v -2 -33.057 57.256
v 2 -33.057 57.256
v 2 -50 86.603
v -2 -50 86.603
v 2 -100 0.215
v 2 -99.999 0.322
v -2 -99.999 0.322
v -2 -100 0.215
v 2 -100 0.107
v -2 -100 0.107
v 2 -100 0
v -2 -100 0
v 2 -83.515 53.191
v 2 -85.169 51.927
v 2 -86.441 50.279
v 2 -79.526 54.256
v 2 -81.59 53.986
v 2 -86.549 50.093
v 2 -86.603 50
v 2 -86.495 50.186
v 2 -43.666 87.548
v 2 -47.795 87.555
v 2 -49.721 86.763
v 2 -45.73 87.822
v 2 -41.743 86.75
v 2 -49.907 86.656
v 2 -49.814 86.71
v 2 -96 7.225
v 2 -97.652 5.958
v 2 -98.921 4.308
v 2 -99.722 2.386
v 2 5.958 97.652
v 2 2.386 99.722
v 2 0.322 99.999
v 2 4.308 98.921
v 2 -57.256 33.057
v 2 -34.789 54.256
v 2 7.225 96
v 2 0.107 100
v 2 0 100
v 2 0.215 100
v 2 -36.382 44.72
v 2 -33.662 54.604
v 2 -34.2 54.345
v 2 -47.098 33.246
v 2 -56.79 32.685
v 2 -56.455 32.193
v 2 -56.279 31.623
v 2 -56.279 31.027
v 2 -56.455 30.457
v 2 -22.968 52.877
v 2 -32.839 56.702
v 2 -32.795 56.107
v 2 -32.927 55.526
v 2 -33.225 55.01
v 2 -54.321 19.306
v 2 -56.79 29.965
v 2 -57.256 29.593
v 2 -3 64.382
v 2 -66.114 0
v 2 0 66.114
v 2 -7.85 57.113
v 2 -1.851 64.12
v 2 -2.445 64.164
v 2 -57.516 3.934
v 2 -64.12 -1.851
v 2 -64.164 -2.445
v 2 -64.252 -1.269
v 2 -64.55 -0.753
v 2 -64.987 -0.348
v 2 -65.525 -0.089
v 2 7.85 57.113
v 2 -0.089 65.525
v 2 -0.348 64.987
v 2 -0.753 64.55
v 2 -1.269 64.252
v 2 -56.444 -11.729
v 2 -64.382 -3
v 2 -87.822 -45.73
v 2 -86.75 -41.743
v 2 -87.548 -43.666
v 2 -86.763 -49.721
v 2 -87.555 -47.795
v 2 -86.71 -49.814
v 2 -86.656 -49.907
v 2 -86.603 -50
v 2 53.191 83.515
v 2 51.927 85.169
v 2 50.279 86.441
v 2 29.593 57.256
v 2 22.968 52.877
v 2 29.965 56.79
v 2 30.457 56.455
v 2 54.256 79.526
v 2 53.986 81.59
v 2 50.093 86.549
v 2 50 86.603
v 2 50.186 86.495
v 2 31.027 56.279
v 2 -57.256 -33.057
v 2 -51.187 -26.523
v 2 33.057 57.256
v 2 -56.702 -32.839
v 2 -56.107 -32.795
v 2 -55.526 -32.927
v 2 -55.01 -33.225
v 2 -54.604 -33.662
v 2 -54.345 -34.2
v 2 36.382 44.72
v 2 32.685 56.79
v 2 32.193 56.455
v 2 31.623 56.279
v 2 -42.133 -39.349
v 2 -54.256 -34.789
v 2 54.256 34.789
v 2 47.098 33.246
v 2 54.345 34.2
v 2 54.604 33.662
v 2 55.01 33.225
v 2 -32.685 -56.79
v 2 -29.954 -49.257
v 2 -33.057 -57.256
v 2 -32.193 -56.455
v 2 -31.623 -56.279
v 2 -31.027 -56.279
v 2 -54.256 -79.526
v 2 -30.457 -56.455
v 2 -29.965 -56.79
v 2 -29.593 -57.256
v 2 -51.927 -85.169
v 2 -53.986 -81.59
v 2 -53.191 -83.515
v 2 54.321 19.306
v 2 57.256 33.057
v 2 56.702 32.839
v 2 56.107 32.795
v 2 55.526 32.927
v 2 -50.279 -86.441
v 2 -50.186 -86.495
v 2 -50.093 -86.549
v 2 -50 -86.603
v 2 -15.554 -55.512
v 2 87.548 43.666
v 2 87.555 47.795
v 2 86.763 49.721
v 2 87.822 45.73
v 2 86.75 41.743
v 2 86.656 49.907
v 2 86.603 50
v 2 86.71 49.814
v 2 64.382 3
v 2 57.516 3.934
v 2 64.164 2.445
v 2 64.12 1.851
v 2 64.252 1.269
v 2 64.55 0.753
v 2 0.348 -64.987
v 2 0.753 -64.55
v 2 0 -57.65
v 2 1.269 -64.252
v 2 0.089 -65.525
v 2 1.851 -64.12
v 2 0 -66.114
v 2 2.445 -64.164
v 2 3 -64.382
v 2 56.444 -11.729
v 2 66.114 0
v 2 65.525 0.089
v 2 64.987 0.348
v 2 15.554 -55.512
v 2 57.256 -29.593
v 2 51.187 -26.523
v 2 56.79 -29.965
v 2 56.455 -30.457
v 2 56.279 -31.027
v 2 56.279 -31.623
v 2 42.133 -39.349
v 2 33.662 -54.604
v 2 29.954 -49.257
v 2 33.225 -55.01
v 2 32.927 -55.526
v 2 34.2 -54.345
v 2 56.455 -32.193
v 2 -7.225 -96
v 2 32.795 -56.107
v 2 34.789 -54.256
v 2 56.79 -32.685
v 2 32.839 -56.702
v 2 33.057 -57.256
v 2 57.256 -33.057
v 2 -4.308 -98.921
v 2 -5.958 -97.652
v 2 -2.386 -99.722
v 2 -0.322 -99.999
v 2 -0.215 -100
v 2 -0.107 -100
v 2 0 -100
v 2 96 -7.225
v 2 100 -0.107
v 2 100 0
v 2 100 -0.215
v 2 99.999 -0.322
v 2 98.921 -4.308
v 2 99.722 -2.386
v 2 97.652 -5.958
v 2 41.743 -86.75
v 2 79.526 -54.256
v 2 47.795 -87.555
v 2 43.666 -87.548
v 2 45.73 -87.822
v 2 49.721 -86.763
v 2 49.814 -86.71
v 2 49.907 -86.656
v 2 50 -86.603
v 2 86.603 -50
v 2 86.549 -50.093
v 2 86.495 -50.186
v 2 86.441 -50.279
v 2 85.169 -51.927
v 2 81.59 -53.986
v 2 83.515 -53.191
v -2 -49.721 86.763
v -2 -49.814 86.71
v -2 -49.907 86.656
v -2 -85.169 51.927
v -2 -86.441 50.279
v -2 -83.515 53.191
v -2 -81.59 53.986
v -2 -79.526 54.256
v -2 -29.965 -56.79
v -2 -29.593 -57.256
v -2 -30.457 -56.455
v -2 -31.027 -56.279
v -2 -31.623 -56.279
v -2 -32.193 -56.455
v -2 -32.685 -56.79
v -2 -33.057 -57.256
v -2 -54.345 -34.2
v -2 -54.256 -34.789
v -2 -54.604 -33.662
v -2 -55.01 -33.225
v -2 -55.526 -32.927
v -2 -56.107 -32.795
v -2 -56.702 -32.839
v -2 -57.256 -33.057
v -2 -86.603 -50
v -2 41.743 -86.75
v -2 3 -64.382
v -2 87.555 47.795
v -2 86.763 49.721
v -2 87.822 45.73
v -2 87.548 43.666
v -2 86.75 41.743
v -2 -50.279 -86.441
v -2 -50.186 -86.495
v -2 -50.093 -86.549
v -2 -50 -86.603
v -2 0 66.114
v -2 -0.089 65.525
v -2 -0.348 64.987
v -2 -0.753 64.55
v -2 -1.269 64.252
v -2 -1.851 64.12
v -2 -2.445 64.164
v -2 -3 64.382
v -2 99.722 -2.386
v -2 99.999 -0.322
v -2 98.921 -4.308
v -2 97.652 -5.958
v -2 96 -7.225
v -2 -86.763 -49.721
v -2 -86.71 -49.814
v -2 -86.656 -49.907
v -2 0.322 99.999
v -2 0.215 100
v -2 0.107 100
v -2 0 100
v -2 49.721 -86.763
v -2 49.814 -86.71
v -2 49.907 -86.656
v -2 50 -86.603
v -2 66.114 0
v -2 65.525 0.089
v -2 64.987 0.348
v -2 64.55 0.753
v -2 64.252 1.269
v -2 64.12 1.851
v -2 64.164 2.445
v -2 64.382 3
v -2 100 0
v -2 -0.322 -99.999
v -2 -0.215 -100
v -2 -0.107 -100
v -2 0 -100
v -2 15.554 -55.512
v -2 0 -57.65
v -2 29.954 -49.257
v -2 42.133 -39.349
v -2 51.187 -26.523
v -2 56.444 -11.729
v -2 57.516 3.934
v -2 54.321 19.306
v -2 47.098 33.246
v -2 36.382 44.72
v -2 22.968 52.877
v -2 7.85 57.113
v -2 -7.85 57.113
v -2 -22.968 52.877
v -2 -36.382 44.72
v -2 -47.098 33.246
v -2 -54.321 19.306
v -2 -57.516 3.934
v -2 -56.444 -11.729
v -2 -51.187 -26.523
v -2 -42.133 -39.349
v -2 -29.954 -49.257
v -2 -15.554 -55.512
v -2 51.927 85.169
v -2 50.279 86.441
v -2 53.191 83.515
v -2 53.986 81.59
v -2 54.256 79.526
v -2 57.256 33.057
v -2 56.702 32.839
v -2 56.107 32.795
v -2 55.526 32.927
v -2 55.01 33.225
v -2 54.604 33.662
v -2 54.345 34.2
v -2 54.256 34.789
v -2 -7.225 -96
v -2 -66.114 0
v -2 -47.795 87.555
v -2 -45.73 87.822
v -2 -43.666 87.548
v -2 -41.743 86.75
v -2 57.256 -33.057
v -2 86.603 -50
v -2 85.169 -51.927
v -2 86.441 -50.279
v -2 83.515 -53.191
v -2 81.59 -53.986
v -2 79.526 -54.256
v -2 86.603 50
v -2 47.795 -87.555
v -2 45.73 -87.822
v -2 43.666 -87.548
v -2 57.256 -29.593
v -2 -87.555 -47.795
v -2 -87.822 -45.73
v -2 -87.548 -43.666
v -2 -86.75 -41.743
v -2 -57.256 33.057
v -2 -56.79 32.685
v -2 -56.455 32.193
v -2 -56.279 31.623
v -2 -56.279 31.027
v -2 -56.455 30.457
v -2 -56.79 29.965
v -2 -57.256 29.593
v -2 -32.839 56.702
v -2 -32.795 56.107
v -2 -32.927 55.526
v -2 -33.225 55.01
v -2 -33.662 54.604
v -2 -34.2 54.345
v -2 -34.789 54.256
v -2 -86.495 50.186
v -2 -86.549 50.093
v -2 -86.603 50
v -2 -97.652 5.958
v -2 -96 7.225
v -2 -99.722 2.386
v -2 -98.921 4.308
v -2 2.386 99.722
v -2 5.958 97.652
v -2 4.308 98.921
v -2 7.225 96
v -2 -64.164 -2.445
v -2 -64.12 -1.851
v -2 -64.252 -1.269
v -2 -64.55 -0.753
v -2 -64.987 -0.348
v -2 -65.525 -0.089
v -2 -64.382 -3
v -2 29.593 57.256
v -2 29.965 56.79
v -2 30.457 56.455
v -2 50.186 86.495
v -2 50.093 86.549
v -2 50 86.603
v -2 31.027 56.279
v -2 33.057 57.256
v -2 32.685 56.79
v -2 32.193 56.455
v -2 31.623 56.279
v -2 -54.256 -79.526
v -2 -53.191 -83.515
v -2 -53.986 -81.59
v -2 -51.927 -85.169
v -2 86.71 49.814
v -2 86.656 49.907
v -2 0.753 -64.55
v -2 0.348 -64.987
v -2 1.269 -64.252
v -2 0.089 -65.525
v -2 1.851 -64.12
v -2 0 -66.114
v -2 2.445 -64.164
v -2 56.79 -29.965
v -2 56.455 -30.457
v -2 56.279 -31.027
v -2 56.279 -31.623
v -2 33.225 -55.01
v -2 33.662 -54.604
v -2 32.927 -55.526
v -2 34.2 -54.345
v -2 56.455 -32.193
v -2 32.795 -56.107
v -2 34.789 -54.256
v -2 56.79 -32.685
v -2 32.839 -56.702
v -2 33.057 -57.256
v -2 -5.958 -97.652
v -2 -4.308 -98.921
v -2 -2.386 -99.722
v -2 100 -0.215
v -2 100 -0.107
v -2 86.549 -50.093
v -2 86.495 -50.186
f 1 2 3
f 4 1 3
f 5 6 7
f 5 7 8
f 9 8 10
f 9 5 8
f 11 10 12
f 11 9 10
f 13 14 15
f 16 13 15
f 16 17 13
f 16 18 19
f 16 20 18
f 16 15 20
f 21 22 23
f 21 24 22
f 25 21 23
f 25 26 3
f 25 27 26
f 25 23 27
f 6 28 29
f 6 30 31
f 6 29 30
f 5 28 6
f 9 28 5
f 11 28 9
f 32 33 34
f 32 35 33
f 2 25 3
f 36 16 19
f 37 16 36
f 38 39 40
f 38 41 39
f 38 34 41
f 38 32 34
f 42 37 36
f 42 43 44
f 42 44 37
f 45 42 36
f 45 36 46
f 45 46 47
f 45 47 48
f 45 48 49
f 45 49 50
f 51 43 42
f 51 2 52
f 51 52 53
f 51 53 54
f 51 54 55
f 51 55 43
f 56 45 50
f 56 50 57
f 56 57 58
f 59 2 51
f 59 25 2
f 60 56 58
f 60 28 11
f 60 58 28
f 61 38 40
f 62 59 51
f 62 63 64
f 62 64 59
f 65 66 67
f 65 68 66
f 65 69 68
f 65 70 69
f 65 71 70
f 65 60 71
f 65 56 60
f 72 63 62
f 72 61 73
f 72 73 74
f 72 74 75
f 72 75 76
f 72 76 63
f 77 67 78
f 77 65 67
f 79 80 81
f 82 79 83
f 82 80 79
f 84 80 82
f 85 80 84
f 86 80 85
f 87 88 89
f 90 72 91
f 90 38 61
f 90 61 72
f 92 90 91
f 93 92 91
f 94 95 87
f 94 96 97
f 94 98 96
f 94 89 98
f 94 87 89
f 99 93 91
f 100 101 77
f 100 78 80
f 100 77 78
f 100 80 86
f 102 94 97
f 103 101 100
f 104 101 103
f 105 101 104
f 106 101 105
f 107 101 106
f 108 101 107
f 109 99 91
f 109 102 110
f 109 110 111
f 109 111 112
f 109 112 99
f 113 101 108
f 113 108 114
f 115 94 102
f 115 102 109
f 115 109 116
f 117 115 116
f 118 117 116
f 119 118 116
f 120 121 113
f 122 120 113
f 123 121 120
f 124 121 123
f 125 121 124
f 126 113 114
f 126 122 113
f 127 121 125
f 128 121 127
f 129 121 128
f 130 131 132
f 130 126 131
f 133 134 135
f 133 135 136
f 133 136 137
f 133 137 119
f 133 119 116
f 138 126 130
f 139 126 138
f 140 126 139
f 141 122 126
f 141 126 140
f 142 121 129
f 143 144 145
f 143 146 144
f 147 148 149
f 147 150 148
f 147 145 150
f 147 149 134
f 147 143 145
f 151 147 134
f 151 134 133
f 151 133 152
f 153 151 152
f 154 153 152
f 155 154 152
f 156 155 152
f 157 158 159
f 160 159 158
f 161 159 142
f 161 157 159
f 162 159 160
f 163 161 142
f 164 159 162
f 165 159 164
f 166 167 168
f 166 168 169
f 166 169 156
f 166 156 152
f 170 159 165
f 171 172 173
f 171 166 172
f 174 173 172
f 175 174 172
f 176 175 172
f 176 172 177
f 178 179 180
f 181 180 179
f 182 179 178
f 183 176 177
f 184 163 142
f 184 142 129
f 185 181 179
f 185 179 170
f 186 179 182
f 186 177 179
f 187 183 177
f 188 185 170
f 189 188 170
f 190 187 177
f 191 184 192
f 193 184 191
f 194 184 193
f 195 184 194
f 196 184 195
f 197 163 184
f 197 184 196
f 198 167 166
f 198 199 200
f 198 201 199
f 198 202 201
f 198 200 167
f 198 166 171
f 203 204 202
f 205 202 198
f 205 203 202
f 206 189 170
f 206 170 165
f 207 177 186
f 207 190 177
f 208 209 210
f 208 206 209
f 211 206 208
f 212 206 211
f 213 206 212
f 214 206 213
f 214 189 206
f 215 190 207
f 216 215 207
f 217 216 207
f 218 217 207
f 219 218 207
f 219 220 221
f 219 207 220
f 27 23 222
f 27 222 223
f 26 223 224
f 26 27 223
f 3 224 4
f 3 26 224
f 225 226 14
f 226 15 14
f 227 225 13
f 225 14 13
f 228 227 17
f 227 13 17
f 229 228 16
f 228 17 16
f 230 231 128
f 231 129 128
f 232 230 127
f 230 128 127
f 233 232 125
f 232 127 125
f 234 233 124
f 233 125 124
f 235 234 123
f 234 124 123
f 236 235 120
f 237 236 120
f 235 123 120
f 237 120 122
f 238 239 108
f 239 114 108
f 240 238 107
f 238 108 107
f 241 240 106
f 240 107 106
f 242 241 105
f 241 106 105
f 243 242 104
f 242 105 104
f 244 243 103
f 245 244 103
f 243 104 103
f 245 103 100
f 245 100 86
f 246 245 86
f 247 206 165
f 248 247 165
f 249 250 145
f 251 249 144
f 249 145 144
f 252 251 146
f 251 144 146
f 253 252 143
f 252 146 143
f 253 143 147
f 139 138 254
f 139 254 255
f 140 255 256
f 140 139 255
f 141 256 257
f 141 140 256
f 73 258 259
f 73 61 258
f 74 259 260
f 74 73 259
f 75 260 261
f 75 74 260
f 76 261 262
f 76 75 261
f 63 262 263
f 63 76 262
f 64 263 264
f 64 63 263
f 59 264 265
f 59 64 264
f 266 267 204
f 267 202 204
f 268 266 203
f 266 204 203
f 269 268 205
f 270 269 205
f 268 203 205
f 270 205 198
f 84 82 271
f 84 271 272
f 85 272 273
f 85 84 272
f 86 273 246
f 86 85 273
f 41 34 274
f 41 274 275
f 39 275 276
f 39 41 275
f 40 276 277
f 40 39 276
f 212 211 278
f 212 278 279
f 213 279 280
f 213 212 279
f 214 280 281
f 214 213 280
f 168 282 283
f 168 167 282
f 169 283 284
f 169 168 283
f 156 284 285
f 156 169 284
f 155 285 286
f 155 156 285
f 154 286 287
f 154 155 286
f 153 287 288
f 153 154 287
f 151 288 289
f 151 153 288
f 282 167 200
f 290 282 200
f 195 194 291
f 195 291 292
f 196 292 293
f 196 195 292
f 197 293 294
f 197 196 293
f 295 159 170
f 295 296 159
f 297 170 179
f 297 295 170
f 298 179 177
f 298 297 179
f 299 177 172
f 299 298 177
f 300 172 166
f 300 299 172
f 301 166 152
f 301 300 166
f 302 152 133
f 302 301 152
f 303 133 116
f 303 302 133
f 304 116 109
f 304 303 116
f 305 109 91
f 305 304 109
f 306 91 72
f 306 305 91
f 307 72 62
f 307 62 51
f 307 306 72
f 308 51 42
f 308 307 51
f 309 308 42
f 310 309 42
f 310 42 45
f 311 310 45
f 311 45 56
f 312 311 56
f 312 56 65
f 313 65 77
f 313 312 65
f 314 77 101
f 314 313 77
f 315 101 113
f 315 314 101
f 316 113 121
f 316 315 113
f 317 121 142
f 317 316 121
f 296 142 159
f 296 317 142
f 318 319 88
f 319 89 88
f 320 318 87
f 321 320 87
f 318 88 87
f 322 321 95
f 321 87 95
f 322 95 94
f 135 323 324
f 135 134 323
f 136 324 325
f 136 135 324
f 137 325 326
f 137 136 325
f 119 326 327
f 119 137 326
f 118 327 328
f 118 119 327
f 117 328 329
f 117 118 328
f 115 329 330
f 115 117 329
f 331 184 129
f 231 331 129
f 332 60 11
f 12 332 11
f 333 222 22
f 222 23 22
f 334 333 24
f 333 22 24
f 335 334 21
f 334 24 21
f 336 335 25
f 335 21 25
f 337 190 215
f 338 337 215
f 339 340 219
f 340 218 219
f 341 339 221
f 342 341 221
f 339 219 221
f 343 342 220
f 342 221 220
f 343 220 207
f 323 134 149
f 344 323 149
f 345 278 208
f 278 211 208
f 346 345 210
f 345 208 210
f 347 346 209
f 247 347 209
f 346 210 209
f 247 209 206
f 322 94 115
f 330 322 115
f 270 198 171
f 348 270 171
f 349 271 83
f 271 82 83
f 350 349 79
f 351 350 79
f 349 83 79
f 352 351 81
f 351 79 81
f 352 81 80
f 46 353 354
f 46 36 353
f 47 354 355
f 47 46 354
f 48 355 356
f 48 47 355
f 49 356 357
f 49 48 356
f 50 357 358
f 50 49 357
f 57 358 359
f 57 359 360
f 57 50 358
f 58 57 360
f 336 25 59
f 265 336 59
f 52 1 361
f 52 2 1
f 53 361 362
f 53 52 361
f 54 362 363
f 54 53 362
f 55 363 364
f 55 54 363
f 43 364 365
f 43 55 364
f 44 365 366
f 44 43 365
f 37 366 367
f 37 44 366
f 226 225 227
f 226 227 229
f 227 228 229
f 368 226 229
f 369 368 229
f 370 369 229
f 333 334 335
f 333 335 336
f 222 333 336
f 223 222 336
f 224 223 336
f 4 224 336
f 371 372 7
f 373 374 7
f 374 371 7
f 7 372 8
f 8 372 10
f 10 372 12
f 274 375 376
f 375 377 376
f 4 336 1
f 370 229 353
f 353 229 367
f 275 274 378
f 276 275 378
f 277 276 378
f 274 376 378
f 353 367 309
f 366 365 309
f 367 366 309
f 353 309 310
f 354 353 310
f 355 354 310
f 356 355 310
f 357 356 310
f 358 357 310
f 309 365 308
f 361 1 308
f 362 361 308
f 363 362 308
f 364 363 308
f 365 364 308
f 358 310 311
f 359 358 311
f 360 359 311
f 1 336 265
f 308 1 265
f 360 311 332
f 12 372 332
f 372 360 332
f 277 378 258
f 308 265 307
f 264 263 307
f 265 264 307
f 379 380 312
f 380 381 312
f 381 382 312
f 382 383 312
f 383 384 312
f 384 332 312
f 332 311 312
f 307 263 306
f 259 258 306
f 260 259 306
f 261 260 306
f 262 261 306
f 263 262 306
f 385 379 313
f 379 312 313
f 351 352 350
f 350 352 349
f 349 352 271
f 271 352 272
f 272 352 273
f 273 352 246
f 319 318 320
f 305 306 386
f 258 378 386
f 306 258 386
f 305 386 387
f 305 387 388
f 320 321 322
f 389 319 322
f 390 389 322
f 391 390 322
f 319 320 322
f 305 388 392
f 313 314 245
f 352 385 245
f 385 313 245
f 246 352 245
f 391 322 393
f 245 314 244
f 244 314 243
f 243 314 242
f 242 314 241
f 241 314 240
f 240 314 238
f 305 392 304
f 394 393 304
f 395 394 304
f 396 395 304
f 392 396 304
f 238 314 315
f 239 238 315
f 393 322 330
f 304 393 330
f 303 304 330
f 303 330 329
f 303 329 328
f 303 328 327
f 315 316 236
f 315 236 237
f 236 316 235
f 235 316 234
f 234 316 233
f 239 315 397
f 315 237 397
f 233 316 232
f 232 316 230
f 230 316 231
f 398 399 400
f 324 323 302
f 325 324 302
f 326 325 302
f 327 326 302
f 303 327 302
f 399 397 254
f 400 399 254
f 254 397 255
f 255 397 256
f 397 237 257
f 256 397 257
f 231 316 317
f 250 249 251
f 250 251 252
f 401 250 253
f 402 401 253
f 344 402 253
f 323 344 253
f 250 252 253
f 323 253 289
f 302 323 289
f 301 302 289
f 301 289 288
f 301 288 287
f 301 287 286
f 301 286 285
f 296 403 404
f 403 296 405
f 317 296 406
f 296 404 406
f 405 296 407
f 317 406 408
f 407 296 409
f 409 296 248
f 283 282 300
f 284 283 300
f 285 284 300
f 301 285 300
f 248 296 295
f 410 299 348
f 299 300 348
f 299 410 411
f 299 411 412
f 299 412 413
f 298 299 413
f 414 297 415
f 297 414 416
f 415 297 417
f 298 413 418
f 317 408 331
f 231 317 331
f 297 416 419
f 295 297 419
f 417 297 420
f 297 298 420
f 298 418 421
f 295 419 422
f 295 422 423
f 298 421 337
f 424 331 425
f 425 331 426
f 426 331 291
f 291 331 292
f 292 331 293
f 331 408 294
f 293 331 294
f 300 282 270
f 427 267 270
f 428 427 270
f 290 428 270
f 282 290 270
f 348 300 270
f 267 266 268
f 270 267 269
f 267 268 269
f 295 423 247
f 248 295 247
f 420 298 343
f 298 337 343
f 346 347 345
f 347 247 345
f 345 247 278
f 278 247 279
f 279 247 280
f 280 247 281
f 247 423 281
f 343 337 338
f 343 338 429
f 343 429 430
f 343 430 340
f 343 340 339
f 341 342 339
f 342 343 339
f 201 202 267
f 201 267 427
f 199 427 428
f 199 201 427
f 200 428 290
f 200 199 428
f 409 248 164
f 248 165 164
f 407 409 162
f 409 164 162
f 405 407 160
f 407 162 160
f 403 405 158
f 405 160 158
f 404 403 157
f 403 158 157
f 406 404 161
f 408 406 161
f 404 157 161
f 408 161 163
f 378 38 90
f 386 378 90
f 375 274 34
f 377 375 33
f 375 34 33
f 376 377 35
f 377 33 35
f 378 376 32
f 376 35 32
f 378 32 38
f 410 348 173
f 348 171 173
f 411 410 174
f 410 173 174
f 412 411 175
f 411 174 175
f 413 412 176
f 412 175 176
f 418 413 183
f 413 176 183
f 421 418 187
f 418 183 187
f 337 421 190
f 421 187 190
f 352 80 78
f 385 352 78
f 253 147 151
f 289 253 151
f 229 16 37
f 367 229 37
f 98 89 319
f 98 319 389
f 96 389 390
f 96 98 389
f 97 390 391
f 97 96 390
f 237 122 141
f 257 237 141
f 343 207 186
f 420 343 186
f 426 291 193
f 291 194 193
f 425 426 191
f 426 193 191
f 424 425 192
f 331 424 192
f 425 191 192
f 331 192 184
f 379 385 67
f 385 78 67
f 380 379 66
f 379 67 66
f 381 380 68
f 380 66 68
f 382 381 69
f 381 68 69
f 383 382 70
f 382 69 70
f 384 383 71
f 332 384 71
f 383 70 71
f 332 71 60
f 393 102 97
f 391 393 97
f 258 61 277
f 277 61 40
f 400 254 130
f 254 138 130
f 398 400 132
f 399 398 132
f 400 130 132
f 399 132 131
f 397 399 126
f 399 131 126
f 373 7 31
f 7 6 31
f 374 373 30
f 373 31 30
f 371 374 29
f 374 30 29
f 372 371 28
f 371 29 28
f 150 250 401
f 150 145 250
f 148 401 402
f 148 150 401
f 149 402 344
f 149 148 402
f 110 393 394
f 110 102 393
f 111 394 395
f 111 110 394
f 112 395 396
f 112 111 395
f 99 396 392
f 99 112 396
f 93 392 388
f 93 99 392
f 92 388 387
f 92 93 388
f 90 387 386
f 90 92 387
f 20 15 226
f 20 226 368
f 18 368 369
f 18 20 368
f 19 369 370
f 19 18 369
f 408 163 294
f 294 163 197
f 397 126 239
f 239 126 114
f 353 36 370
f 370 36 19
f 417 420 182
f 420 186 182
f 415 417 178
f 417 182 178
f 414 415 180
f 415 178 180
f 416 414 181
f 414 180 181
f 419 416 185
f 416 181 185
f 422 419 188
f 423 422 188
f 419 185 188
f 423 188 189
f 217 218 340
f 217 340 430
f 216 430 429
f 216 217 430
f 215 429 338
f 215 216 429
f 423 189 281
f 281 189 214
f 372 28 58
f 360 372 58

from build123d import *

# Parameters (mm, degrees)
ESQUISSE10_R                       = 100
ESQUISSE10_R_2                     = 57.65
BOSS_EXTRU_1_DEPTH                 = 2
ENL_V_MAT_EXTRU_3_DEPTH            = 3
CONG_3_R                           = 8
CONG_4_R                           = 2
R_P_TITION_CIRCULAIRE4_COUNT       = 12
CONG_3_OF_R_P_TITION_CIRCULAIRE4_R = 8
CONG_4_OF_R_P_TITION_CIRCULAIRE4_R = 2


with BuildPart() as part:
    # Esquisse10 → Boss.-Extru.1 (new body, symmetric)
    with BuildSketch(Plane(origin=(0, 0, 0), x_dir=(0, 0, -1), z_dir=(1, 0, 0))):
        Circle(ESQUISSE10_R)
        Circle(ESQUISSE10_R_2, mode=Mode.SUBTRACT)
    extrude(amount=BOSS_EXTRU_1_DEPTH, both=True)

    # Esquisse11 → Enlèv. mat.-Extru.3 (cut, symmetric)
    with BuildSketch(Plane(origin=(0, 0, 0), x_dir=(0, 0, -1), z_dir=(1, 0, 0))):
        Polygon((-467.515801905, 332.57037408), (-45.619089874, 88.988193819), (0, 62.65), (0, 100), (0, 587.164360523), (-465.974399707, 1442.842054211), (-933.490201612, 1188.248067768), align=None)
    enl_v_mat_extru_3 = extrude(amount=ENL_V_MAT_EXTRU_3_DEPTH, both=True, mode=Mode.SUBTRACT)

    # Congé3
    cong_3_edges = [part.edges().sort_by_distance(p)[0] for p in [
        (0, 88.988193819, 45.619089874),
    ]]
    fillet(cong_3_edges, radius=CONG_3_R)

    # Congé4
    cong_4_edges = [part.edges().sort_by_distance(p)[0] for p in [
        (0, 62.65, 0),
    ]]
    fillet(cong_4_edges, radius=CONG_4_R)

    # Répétition circulaire4: Enlèv. mat.-Extru.3 ×12 about axis
    r_p_tition_circulaire4_axis = Axis((0, 0, 0), (1, 0, 0))
    for i in range(1, R_P_TITION_CIRCULAIRE4_COUNT):
        add(enl_v_mat_extru_3.rotate(r_p_tition_circulaire4_axis, i * 360 / R_P_TITION_CIRCULAIRE4_COUNT), mode=Mode.SUBTRACT)

    # Congé3 of Répétition circulaire4
    cong_3_of_r_p_tition_circulaire4_edges = [part.edges().sort_by_distance(p)[0] for p in [
        (0, 54.256491547, 84.001387637),
        (0, 4.986806181, 99.875581421),
        (0, -45.619089874, 88.988193819),
        (0, -84.001387637, 54.256491547),
        (0, -99.875581421, 4.986806181),
        (0, -88.988193819, -45.619089874),
        (0, -54.256491547, -84.001387637),
        (0, -4.986806181, -99.875581421),
        (0, 45.619089874, -88.988193819),
        (0, 84.001387637, -54.256491547),
        (0, 99.875581421, -4.986806181),
    ]]
    fillet(cong_3_of_r_p_tition_circulaire4_edges, radius=CONG_3_OF_R_P_TITION_CIRCULAIRE4_R)

    # Congé4 of Répétition circulaire4
    cong_4_of_r_p_tition_circulaire4_edges = [part.edges().sort_by_distance(p)[0] for p in [
        (0, 54.256491547, 31.325),
        (0, 31.325, 54.256491547),
        (0, 0, 62.65),
        (0, -31.325, 54.256491547),
        (0, -54.256491547, 31.325),
        (0, -62.65, 0),
        (0, -54.256491547, -31.325),
        (0, -31.325, -54.256491547),
        (0, 0, -62.65),
        (0, 31.325, -54.256491547),
        (0, 54.256491547, -31.325),
    ]]
    fillet(cong_4_of_r_p_tition_circulaire4_edges, radius=CONG_4_OF_R_P_TITION_CIRCULAIRE4_R)


solid = part.part
